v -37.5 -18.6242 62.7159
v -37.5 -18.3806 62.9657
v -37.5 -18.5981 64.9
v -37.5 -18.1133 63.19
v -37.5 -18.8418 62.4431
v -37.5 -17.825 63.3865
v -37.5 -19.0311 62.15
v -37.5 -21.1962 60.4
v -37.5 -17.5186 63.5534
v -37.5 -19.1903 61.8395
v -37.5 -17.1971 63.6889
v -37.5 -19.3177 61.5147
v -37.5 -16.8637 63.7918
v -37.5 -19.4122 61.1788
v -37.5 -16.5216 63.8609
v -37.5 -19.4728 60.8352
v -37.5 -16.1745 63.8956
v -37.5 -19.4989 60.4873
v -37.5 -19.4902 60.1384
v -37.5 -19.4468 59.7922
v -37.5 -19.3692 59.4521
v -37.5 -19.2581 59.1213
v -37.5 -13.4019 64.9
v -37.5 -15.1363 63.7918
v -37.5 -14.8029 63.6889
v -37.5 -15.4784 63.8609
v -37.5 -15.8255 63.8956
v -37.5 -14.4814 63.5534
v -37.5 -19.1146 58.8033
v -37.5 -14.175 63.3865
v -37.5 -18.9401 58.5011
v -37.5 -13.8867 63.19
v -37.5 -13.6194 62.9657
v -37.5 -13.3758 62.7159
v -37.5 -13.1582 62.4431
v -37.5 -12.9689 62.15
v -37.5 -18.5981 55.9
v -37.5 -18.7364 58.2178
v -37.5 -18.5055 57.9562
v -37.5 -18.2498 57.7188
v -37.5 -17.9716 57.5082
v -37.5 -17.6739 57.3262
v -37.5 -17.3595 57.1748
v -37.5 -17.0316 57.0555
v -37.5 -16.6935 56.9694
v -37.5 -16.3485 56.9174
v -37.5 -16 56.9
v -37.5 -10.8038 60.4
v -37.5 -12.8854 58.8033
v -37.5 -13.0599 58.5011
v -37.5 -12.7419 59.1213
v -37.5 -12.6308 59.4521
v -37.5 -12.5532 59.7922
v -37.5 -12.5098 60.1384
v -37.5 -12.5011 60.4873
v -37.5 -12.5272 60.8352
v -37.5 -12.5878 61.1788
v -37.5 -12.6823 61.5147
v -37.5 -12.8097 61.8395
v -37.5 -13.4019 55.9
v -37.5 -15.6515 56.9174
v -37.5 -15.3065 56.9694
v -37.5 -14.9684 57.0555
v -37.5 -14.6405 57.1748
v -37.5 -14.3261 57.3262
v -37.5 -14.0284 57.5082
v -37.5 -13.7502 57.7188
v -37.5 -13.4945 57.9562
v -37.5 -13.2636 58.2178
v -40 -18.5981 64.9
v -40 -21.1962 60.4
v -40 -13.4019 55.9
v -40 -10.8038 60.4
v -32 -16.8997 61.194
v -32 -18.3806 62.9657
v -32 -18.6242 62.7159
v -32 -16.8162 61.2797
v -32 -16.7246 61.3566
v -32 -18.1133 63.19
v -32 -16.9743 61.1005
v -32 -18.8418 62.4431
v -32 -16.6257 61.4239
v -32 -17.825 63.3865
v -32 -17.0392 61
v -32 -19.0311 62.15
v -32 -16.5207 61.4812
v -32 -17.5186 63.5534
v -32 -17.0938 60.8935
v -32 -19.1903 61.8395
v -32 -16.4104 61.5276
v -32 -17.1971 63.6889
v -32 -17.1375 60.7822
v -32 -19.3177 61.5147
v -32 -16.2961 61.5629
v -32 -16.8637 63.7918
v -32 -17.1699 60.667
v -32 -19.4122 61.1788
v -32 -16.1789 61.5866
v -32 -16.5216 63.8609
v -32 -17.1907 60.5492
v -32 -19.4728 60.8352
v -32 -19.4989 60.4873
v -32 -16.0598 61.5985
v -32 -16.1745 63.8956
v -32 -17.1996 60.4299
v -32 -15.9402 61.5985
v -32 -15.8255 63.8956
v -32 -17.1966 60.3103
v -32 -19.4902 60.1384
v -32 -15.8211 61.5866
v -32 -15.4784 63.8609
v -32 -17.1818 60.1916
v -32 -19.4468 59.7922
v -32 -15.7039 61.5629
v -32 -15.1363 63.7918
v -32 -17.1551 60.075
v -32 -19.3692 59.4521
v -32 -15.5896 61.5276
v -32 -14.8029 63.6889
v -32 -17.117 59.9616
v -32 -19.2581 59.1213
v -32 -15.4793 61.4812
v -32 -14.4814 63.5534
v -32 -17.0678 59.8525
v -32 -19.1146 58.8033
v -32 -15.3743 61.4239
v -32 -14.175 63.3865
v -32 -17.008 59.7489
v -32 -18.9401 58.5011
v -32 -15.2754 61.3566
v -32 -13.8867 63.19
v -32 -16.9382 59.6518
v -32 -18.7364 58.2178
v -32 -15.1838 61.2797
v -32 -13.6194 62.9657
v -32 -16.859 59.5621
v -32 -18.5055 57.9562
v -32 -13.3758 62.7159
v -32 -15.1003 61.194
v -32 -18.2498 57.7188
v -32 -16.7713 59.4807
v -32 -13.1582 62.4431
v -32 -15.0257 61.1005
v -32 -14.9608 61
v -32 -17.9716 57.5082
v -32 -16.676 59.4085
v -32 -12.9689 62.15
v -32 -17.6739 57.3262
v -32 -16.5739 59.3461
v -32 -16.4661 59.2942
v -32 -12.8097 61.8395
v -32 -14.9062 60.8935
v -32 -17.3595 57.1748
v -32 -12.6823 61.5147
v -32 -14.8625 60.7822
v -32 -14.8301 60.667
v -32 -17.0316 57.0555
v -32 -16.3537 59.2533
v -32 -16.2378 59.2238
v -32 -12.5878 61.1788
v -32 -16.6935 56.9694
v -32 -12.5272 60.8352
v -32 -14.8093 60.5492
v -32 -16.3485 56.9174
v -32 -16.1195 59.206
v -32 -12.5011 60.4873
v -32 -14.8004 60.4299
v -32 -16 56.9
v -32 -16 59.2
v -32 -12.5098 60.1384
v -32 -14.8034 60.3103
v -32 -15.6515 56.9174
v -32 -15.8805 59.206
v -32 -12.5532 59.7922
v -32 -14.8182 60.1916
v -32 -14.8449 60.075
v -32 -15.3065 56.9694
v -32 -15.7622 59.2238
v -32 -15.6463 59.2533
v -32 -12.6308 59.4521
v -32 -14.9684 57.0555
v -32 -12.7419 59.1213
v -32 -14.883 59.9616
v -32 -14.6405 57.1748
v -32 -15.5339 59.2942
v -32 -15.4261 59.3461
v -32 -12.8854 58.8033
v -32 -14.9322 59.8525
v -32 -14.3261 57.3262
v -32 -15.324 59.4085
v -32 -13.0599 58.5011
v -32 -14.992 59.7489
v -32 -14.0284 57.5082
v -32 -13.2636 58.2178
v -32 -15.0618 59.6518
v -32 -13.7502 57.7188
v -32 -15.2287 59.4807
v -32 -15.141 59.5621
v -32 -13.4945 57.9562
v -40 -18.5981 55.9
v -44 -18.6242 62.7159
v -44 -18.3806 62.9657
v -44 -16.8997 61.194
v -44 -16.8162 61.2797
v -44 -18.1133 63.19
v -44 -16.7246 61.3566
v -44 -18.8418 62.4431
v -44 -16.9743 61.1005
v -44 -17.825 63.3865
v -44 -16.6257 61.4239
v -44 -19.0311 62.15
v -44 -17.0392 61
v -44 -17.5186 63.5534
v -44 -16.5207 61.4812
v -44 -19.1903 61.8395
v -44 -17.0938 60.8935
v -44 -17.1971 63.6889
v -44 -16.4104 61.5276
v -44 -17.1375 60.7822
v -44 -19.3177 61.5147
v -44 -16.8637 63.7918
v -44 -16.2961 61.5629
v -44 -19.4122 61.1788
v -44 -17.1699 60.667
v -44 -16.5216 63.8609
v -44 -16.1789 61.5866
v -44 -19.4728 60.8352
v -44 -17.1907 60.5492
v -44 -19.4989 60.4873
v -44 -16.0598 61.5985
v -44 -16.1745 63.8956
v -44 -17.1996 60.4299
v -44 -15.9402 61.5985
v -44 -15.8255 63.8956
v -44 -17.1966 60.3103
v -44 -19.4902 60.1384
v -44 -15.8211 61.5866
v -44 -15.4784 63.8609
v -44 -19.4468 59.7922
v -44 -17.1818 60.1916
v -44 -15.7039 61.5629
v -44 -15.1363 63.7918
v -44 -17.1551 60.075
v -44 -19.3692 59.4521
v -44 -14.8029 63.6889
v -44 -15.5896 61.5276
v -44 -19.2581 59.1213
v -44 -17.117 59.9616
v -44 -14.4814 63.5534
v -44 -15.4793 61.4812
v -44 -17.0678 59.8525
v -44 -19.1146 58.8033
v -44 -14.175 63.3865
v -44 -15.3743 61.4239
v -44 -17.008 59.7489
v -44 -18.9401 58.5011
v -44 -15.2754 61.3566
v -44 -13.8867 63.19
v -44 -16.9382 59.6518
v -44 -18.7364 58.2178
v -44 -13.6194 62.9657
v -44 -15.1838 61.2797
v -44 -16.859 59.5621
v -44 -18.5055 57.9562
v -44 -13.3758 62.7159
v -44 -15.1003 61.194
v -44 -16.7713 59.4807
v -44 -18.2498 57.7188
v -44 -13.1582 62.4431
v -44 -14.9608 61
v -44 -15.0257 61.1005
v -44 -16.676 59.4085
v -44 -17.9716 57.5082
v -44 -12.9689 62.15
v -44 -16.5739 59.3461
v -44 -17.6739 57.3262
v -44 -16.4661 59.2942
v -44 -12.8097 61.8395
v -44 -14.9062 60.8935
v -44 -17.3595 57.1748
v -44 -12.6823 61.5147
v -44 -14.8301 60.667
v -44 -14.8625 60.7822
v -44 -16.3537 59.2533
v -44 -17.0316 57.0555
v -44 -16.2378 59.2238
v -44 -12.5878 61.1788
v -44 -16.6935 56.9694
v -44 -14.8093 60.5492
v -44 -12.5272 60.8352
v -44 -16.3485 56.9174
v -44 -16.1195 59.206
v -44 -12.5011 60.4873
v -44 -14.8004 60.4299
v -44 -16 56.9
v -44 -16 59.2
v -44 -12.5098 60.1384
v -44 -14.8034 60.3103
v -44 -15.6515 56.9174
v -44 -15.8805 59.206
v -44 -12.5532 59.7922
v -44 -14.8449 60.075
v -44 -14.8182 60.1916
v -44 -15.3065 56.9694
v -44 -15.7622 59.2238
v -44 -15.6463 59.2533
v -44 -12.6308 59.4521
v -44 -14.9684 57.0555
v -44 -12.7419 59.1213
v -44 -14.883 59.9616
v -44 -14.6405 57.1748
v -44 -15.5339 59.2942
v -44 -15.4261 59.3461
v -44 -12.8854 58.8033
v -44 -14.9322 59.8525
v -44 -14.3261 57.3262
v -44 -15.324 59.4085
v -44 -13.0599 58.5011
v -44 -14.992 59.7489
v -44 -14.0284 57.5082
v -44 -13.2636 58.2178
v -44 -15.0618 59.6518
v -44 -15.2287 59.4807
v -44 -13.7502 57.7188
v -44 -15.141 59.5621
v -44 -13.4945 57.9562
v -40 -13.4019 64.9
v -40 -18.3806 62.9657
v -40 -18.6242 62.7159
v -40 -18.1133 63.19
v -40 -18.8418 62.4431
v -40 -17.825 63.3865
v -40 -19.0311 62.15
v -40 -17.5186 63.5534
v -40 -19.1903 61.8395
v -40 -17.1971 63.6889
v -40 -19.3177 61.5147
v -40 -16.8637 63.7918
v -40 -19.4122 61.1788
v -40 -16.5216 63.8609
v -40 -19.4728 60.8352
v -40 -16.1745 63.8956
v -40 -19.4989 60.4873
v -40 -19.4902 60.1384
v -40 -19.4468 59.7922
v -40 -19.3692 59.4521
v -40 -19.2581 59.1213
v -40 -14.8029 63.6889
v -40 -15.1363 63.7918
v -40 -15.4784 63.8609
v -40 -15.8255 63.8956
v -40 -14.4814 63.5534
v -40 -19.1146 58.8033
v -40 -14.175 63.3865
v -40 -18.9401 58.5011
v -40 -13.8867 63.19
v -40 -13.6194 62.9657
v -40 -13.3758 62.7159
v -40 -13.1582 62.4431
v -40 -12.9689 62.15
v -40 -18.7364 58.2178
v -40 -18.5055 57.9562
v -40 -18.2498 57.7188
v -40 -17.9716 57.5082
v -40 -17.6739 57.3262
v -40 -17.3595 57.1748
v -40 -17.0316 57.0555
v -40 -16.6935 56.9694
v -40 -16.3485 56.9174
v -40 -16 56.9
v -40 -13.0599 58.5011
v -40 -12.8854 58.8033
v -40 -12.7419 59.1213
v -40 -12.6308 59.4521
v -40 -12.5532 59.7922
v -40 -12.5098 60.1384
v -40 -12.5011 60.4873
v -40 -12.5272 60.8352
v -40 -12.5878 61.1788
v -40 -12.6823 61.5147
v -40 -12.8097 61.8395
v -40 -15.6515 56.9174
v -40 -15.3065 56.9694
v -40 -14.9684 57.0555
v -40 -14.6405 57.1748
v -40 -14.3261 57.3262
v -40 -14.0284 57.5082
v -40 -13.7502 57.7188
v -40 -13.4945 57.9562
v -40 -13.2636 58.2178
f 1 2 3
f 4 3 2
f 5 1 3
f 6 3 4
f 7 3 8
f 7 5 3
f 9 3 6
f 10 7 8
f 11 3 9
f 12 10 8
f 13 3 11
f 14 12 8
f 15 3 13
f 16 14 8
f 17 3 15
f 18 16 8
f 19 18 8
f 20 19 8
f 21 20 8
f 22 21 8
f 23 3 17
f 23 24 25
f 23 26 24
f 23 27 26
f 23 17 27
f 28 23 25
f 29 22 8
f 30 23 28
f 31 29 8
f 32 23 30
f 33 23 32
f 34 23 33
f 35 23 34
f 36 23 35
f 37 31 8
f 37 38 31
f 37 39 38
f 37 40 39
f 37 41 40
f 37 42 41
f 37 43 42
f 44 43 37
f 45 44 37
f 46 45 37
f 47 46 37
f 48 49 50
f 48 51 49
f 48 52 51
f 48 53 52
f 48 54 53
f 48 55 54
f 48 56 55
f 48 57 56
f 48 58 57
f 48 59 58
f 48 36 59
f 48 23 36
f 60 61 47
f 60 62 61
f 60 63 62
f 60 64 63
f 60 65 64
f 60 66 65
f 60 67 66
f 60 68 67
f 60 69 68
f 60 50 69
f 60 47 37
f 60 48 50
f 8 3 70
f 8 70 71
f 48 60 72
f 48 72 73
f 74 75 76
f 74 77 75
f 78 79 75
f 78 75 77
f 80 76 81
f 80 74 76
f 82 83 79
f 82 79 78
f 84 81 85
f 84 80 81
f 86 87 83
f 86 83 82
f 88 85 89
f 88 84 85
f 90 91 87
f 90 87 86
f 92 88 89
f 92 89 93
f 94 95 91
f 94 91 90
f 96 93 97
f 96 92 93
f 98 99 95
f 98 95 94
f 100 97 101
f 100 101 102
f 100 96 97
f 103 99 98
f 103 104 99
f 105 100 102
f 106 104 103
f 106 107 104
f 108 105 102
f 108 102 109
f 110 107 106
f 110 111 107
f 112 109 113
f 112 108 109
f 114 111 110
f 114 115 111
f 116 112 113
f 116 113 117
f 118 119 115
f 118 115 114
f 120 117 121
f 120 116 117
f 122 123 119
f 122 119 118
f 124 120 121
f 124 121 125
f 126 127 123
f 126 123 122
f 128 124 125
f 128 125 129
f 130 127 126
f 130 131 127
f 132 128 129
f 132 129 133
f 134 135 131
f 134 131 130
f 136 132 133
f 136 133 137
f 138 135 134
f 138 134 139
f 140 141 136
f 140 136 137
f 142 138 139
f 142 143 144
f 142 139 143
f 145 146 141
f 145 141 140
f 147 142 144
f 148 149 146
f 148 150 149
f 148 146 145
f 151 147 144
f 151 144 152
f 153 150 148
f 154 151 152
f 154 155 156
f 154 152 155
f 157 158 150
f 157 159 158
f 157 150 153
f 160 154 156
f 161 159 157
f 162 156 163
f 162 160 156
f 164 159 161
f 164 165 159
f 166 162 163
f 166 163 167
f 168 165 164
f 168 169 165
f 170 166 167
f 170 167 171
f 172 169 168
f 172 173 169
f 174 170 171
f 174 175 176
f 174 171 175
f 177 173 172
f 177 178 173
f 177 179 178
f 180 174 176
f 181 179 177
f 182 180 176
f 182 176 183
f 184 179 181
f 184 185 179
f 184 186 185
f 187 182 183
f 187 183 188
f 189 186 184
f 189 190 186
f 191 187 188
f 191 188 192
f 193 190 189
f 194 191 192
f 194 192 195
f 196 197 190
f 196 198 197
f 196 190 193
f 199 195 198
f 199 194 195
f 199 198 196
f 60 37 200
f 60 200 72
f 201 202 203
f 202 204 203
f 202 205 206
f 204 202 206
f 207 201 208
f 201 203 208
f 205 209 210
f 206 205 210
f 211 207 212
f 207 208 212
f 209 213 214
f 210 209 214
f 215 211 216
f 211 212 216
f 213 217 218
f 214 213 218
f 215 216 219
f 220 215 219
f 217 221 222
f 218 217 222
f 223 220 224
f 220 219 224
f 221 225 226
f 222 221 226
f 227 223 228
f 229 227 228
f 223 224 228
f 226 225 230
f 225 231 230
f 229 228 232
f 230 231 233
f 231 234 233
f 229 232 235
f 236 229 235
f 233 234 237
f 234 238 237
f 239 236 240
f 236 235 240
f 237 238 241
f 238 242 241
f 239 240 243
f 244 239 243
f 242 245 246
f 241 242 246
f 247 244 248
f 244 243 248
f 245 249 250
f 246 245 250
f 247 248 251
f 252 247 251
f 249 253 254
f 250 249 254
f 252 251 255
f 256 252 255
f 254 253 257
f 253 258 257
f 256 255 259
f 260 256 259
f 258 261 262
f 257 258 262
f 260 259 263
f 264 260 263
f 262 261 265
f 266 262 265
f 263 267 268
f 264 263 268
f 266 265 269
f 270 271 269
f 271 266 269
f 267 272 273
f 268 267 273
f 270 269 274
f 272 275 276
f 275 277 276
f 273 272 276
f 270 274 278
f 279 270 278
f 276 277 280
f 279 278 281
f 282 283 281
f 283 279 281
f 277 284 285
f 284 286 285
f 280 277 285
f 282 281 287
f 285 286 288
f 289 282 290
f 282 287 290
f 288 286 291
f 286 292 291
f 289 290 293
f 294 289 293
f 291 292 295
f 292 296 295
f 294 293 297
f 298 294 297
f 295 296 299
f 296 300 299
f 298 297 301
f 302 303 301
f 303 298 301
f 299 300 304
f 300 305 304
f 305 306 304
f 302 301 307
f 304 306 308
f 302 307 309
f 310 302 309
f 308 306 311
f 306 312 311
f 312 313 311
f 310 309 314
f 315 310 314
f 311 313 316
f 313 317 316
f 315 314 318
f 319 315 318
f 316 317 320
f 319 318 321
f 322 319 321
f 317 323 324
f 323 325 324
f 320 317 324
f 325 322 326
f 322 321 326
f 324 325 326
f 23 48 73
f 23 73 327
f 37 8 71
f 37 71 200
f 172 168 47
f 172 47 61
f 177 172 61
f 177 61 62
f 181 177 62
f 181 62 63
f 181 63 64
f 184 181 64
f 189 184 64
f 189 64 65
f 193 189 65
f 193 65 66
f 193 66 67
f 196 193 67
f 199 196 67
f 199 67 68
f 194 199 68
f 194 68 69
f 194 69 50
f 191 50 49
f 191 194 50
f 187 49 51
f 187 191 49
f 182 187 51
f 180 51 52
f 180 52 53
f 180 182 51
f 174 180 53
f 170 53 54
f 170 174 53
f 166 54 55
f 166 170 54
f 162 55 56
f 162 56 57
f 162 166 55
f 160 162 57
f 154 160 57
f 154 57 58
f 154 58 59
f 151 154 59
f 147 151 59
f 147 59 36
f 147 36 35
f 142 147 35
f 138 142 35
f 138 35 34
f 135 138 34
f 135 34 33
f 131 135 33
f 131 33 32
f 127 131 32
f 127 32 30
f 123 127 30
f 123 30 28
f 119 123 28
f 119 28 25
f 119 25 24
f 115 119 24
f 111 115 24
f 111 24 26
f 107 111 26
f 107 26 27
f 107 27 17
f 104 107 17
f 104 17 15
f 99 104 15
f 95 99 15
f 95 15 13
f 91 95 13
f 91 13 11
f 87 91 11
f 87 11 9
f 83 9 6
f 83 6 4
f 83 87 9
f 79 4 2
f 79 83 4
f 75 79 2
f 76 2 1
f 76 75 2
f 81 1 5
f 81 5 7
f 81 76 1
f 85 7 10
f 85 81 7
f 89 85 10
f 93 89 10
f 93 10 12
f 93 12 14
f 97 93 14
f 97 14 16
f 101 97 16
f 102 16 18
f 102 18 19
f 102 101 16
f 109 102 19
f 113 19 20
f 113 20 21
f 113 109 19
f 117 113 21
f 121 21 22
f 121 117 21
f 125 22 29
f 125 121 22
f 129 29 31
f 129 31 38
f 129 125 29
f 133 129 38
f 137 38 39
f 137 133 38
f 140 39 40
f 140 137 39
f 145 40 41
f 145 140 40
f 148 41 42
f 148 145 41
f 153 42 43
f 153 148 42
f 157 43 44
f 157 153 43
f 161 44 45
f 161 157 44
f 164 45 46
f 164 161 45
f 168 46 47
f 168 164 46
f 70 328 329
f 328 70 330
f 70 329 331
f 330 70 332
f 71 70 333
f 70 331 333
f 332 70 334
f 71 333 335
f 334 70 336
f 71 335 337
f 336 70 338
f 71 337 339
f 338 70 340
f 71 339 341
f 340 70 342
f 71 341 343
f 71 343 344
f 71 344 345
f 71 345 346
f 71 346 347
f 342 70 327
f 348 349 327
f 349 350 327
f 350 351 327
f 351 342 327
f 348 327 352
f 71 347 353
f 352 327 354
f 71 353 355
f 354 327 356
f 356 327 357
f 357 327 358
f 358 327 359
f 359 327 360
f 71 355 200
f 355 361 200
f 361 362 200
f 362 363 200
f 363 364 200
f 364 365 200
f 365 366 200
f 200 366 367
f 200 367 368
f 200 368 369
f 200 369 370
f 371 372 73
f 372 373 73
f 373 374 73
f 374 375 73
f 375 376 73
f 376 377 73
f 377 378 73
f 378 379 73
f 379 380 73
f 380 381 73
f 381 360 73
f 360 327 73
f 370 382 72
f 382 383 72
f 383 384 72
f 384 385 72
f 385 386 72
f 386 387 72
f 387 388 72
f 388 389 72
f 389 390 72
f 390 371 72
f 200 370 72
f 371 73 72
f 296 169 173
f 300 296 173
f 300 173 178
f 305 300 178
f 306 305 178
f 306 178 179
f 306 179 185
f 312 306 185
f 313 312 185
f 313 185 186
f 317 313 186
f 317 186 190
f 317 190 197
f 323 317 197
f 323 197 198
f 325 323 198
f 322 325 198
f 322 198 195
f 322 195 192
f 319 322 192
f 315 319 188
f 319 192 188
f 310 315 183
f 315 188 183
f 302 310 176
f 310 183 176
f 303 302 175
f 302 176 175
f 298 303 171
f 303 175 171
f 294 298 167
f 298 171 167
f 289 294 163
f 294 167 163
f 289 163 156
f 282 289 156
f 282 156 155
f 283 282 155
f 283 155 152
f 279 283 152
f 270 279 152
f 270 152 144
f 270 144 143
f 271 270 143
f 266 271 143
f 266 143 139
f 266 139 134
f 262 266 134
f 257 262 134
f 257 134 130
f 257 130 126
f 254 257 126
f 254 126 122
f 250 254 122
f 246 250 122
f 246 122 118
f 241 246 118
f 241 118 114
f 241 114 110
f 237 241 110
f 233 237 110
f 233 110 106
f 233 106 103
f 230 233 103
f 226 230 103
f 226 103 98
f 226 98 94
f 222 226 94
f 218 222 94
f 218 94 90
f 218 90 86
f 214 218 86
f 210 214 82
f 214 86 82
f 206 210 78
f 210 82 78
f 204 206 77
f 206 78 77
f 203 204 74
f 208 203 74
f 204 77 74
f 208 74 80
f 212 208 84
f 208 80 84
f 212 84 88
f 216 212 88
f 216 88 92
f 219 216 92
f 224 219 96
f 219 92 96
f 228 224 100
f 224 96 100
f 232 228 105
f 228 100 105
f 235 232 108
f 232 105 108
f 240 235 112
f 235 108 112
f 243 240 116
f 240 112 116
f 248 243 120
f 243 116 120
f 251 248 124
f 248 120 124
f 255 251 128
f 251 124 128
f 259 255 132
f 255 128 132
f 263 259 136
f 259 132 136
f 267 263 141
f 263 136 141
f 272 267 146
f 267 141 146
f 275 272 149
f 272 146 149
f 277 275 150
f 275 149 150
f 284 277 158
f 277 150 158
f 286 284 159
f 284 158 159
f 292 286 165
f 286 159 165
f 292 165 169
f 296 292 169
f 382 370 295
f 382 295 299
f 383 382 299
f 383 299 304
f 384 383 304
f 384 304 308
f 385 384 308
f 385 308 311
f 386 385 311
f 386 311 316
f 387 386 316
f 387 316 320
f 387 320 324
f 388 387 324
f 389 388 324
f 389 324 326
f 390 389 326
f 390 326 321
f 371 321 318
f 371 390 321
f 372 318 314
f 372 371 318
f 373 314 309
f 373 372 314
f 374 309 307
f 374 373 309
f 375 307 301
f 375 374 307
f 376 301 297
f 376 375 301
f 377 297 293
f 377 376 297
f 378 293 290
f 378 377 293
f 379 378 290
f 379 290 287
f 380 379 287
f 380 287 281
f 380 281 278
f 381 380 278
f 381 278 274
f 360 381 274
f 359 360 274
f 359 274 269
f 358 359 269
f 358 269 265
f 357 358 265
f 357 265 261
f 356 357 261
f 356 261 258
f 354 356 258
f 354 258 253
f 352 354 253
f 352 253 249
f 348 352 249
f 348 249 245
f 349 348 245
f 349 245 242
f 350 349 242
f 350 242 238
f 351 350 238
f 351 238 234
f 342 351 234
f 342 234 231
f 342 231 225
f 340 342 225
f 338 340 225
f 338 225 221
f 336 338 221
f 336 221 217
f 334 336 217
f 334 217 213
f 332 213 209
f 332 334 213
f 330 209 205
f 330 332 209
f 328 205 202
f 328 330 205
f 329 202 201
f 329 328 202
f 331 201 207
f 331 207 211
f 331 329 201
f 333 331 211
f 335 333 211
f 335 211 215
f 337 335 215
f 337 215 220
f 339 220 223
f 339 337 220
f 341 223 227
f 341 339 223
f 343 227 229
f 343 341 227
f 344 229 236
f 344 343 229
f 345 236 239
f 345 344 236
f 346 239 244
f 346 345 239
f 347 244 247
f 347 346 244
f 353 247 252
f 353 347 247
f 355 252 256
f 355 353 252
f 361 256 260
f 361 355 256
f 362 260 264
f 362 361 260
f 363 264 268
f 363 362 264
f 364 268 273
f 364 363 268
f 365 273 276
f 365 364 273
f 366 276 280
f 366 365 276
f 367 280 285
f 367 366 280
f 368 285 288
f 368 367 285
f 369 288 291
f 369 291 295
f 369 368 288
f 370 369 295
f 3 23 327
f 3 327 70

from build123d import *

# Parameters (mm, degrees)
SK_BARRIL_R        = 3.5
SK_BARRIL_R_2      = 1.2
BARRIL_DEPTH       = 12
CONTRATUERCA_START = 2.5
SK_CONTRATUERCA_R  = 1.2
CONTRATUERCA_DEPTH = 2.5


with BuildPart() as part:
    # Sk_barril → Barril (new body)
    with BuildSketch(Plane(origin=(-32, 0, 0), x_dir=(0, 0, -1), z_dir=(1, 0, 0))):
        with Locations((-60.4, -16)):
            Circle(SK_BARRIL_R)
        with Locations((-60.4, -16)):
            Circle(SK_BARRIL_R_2, mode=Mode.SUBTRACT)
    extrude(amount=-BARRIL_DEPTH)

    # Sk_contratuerca → Contratuerca (add)
    with BuildSketch(Plane(origin=(-40, 0, 0), x_dir=(0, 0, -1), z_dir=(1, 0, 0)).offset(CONTRATUERCA_START)):
        Polygon((-60.4, -10.803847577), (-64.9, -13.401923789), (-64.9, -18.598076211), (-60.4, -21.196152423), (-55.9, -18.598076211), (-55.9, -13.401923789), align=None)
        with Locations((-60.4, -16)):
            Circle(SK_CONTRATUERCA_R, mode=Mode.SUBTRACT)
    extrude(amount=-CONTRATUERCA_DEPTH)


solid = part.part
